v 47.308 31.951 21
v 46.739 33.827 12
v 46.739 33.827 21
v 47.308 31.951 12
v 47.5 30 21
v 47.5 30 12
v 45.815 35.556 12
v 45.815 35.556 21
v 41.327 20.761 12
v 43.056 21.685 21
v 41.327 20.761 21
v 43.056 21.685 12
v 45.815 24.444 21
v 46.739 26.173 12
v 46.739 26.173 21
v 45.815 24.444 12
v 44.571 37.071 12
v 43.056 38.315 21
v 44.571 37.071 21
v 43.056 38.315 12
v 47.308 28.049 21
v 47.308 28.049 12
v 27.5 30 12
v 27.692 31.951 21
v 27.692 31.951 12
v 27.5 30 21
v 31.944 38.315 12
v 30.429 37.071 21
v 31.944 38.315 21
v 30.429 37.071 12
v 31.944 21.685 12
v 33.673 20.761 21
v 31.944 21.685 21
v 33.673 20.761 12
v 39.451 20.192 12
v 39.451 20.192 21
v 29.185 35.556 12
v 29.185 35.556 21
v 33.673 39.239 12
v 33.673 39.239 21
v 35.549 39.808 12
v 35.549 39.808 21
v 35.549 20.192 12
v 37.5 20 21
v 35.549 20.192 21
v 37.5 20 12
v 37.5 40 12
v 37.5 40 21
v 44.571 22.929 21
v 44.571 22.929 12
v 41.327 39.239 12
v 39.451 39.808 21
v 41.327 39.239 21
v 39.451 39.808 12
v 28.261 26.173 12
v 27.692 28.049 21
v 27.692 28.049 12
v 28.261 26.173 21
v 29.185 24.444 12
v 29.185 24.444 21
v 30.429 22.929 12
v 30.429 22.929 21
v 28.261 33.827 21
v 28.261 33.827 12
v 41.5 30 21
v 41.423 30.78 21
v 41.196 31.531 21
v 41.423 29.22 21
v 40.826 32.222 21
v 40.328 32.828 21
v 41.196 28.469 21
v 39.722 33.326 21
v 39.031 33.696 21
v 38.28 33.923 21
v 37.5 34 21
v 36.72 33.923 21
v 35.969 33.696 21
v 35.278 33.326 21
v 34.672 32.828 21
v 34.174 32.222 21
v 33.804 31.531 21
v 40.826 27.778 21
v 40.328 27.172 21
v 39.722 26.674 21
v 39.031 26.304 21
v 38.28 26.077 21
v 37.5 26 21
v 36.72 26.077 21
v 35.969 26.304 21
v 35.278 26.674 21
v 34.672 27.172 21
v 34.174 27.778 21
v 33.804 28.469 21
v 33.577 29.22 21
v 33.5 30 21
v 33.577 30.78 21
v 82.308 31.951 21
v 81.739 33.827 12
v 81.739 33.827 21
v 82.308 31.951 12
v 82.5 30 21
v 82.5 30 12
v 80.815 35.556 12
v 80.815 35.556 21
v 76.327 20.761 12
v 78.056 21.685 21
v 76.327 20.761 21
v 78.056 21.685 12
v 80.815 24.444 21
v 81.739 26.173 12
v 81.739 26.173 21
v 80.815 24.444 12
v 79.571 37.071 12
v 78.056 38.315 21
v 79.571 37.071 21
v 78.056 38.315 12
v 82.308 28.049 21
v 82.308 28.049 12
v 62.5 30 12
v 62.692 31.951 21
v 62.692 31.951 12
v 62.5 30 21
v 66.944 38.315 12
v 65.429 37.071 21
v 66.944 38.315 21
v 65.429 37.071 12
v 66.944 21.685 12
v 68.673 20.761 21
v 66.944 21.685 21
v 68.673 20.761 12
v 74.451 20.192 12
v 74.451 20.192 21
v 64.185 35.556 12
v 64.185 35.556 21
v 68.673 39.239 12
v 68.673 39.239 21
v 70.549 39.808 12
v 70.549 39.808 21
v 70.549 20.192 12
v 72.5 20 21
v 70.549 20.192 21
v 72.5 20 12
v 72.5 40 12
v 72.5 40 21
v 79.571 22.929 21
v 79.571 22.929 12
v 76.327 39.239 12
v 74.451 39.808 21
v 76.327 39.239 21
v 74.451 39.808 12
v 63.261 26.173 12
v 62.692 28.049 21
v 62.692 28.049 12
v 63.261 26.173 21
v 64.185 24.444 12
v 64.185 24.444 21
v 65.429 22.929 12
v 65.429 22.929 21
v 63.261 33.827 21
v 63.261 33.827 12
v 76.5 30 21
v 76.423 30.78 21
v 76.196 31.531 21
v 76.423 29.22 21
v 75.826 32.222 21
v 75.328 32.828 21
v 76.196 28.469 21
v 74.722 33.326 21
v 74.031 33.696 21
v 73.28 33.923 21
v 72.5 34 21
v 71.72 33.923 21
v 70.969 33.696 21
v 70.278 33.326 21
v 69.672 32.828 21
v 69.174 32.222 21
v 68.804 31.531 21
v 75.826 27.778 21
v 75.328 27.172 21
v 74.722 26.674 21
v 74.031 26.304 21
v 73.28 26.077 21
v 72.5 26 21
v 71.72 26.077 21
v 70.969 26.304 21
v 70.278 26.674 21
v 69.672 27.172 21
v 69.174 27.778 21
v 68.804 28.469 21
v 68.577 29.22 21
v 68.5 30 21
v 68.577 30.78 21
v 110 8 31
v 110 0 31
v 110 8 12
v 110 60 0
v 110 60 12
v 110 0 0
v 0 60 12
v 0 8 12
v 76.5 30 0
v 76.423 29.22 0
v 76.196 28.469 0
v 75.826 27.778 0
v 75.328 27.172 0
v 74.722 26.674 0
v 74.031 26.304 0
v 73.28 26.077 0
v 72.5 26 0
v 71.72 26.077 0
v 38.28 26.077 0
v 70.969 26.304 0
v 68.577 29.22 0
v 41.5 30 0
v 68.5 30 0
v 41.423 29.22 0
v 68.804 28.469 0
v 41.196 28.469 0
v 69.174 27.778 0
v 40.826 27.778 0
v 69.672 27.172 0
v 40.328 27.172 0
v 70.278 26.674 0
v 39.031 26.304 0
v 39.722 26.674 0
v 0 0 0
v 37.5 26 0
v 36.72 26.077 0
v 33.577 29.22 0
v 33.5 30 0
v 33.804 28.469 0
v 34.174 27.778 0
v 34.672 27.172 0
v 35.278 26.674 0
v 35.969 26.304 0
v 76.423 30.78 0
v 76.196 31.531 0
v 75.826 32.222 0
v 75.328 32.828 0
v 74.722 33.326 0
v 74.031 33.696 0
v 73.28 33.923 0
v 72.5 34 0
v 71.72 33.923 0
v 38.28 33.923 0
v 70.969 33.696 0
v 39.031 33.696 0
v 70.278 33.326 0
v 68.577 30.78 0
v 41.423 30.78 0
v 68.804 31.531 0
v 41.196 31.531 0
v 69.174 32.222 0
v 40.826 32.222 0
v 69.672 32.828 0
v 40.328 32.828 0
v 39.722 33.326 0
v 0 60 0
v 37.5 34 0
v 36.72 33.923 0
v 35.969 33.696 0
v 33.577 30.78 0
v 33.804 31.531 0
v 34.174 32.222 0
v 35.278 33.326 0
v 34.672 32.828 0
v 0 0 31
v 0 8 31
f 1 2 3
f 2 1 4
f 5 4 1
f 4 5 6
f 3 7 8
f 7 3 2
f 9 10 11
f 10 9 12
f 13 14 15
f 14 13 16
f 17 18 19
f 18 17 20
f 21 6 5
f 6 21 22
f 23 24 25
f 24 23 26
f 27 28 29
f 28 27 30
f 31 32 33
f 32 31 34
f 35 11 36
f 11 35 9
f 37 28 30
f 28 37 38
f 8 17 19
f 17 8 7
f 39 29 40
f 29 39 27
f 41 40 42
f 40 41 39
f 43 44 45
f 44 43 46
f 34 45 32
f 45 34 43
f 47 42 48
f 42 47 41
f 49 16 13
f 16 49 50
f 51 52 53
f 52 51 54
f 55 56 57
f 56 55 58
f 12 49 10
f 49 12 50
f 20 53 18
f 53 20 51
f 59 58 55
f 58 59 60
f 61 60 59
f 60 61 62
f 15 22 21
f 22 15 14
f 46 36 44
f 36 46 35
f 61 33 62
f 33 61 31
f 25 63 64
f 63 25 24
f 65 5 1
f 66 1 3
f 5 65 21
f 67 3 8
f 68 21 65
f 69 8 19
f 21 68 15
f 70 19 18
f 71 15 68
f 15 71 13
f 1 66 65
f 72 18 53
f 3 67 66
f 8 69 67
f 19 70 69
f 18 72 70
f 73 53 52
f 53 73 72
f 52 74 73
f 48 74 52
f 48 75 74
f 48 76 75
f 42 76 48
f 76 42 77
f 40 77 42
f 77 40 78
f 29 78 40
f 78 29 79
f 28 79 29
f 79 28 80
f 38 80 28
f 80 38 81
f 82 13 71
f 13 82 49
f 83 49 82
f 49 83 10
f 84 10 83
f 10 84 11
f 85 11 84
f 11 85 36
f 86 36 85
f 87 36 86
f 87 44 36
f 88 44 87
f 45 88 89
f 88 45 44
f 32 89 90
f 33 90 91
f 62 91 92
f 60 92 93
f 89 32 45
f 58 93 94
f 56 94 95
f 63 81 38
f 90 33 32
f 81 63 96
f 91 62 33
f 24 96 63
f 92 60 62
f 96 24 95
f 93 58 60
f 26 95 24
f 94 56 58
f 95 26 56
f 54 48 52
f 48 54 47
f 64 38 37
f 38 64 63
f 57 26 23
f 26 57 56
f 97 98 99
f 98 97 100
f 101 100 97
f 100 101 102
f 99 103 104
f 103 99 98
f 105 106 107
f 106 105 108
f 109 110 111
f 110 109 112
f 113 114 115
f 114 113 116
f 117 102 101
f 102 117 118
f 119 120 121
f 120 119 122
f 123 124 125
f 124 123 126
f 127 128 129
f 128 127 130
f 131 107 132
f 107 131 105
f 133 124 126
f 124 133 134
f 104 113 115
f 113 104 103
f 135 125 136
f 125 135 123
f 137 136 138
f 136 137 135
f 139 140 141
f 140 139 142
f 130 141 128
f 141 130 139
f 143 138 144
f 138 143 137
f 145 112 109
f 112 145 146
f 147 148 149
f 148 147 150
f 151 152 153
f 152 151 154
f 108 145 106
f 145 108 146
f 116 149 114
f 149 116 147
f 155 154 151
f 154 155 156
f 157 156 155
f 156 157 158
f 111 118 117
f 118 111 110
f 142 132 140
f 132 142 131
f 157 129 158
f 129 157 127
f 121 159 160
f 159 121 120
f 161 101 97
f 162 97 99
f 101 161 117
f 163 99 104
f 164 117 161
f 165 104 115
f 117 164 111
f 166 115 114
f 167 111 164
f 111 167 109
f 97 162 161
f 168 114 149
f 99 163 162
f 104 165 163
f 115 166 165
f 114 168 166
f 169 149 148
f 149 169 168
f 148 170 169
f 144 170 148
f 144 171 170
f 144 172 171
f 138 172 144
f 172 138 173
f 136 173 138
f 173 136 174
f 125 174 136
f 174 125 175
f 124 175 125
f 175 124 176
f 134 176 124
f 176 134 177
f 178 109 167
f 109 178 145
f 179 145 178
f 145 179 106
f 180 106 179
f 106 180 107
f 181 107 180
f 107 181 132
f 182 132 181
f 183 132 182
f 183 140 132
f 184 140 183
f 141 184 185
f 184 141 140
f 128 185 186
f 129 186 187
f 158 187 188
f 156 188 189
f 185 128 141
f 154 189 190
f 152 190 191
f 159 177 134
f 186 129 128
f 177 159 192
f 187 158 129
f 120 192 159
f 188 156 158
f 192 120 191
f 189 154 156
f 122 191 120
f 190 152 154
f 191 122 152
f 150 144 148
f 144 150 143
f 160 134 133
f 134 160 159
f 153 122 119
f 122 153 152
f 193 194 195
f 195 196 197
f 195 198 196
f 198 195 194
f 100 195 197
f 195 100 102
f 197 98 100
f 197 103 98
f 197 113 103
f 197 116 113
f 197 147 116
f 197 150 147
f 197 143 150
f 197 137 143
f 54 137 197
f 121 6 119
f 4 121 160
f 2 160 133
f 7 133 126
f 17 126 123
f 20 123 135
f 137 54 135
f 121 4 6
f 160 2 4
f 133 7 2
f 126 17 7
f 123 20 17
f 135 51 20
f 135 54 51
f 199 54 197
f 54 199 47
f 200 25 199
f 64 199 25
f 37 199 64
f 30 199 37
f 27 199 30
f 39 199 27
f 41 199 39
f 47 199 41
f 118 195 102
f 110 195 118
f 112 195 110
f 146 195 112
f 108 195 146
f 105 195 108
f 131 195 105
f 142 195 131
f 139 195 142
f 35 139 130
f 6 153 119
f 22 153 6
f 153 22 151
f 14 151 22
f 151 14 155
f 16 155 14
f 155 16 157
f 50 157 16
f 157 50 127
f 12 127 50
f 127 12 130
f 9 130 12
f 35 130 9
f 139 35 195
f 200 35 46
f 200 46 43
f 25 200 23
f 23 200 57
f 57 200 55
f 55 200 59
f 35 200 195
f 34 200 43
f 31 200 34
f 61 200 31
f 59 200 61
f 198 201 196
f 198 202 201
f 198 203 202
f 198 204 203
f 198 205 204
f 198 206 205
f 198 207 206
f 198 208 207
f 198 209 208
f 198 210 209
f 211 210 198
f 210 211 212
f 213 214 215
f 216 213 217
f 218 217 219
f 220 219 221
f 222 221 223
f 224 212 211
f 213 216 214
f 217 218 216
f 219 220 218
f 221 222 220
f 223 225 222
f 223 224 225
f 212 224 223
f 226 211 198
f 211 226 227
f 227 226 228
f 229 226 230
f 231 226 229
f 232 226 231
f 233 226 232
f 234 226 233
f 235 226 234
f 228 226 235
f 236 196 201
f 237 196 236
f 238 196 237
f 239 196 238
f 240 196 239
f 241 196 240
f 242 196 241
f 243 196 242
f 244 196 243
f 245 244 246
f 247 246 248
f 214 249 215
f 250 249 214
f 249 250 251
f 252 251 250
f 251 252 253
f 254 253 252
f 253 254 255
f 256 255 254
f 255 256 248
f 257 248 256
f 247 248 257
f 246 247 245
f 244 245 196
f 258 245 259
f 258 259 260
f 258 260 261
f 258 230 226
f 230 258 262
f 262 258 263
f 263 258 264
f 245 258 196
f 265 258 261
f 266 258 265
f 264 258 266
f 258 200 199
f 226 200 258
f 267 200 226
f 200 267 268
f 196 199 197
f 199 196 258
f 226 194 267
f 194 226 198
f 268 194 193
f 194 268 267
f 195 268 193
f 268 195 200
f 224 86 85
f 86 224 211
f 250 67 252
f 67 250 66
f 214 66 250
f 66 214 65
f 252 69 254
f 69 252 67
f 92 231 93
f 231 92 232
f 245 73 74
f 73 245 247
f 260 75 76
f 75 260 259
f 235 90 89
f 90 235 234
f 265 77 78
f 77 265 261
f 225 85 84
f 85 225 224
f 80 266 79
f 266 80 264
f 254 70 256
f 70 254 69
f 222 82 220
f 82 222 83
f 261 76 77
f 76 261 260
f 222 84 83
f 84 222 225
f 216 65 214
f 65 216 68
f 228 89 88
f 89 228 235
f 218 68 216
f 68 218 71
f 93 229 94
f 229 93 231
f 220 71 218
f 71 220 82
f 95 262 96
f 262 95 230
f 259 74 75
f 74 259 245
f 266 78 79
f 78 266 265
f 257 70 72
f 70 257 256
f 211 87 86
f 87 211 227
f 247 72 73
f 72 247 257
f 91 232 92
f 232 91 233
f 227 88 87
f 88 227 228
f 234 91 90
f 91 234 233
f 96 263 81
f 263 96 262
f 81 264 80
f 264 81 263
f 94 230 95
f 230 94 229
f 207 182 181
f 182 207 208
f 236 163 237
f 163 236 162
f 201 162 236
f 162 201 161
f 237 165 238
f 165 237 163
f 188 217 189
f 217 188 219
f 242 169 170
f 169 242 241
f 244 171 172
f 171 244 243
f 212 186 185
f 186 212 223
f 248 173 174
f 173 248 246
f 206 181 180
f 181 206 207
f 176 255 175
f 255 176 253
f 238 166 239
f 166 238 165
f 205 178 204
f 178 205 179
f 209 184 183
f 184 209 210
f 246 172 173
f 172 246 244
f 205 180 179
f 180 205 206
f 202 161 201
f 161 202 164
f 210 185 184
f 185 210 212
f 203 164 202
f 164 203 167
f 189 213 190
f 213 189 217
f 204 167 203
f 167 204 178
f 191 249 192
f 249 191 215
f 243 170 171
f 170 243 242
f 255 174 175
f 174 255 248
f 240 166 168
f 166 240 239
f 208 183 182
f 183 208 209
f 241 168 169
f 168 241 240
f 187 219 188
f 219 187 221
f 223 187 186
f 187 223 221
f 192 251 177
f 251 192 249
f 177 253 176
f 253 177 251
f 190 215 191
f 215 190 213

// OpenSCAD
$fn = 32;

// ----------------------------------------------------------------------
// Drill jig: fence jig
// ----------------------------------------------------------------------

// --- parameters (mm) ---
plate_l = 110;            // plate length, X
plate_w = 60;             // plate width, Y
plate_t = 12;             // plate thickness
boss_d = 20;              // guide boss diameter
boss_h = 10;              // boss height above the plate
guide_d = 8;              // guide hole diameter
boss_pitch = 35;          // boss pitch
fence_h = 20;             // fence height above the plate
fence_t = 8;              // fence thickness

n_boss = 2;  // guide bosses
boss_x0 = (plate_l - (n_boss - 1) * boss_pitch) / 2;  // first boss X
boss_top = plate_t - 1 + boss_h;  // boss crown height
fence_top = plate_t - 1 + fence_h;  // fence crown height
total_h = max([fence_top, boss_top]);  // overall height

difference() {
  union() {
  cube([plate_l, plate_w, plate_t]);
  for (i = [0 : n_boss - 1])
    translate([boss_x0 + i * boss_pitch, plate_w / 2, plate_t - 1])
      cylinder(h = boss_h, d = boss_d);
  translate([0, 0, plate_t - 1]) cube([plate_l, fence_t, fence_h]);
  }
  for (i = [0 : n_boss - 1])
    translate([boss_x0 + i * boss_pitch, plate_w / 2, -1])
      cylinder(h = plate_t + boss_h, d = guide_d);
}
